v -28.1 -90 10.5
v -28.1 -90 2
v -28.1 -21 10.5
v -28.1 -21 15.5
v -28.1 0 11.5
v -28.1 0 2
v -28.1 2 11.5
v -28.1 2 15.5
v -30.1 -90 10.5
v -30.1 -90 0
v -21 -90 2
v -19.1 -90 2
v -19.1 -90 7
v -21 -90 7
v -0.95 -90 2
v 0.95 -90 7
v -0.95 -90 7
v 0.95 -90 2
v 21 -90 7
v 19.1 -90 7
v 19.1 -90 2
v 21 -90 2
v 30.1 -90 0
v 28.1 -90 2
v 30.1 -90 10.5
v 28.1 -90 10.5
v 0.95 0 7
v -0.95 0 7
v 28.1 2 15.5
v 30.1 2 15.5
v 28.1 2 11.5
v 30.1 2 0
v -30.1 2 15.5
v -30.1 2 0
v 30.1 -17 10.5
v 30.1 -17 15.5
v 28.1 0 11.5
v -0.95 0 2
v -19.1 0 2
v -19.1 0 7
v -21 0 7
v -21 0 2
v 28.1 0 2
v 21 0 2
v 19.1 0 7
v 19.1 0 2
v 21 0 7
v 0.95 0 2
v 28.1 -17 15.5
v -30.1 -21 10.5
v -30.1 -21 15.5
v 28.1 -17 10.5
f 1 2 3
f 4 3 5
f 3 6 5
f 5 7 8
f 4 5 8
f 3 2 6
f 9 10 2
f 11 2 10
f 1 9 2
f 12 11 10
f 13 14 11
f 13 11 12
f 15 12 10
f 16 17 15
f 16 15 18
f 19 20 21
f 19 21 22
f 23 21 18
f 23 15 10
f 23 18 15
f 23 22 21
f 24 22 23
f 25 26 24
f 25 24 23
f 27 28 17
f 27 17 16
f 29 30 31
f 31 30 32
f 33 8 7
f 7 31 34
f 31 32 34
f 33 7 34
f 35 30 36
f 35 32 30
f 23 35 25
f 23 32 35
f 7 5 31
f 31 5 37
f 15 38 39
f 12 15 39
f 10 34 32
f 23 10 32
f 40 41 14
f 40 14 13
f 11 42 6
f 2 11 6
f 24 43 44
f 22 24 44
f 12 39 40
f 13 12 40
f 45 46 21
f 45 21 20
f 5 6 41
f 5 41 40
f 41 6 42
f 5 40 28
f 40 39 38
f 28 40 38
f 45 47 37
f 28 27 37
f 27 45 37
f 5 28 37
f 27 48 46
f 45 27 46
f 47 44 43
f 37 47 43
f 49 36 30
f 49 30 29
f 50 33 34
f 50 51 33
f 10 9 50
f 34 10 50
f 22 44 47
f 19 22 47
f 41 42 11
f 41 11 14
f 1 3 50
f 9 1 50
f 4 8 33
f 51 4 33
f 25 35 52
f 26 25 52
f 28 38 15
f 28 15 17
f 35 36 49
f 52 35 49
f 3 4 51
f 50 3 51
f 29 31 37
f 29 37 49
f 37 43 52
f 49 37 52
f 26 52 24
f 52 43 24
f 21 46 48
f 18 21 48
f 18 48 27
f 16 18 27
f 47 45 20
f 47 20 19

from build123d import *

# Parameters (mm, degrees)
SKETCH_W      = 1.9
SKETCH_H      = 5
PAD_DEPTH     = 90
SKETCH001_W   = 2
SKETCH001_H   = 69
SKETCH001_H_2 = 73
POCKET_DEPTH  = 5
SKETCH002_W   = 60.2
SKETCH002_H   = 11.5
PAD001_DEPTH  = 2
SKETCH004_W   = 2
SKETCH004_H   = 2
PAD002_DEPTH  = 4


with BuildPart() as part:
    # Sketch → Pad (new body)
    with BuildSketch(Plane.XZ):
        Polygon((-30.1, 0), (30.1, 0), (30.1, 15.5), (28.1, 15.5), (28.1, 2), (-28.1, 2), (-28.1, 15.5), (-30.1, 15.5), align=None)
        with Locations((0, 4.5)):
            Rectangle(SKETCH_W, SKETCH_H)
        with Locations((-20.05, 4.5)):
            Rectangle(SKETCH_W, SKETCH_H)
        with Locations((20.05, 4.5)):
            Rectangle(SKETCH_W, SKETCH_H)
    extrude(amount=PAD_DEPTH)

    # Sketch001 (on Face3 of Pad) → Pocket (cut)
    with BuildSketch(Plane(origin=(0, 0, 15.5), x_dir=(-1, 0, 0), z_dir=(0, 0, 1))):
        with Locations((29.1, 55.5)):
            Rectangle(SKETCH001_W, SKETCH001_H)
        with Locations((-29.1, 53.5)):
            Rectangle(SKETCH001_W, SKETCH001_H_2)
    extrude(amount=-POCKET_DEPTH, mode=Mode.SUBTRACT)

    # Sketch002 (on Face2 of Pocket) → Pad001 (join)
    with BuildSketch(Plane(origin=(0, 0, 0), x_dir=(1, 0, 0), z_dir=(0, 1, 0))):
        with Locations((0, -5.75)):
            Rectangle(SKETCH002_W, SKETCH002_H)
    extrude(amount=PAD001_DEPTH)

    # Sketch004 → Pad002 (join)
    with BuildSketch(Plane(origin=(0, 0, 11.5), x_dir=(-1, 0, 0), z_dir=(0, 0, 1))):
        with Locations((-29.1, -1)):
            Rectangle(SKETCH004_W, SKETCH004_H)
        with Locations((29.1, -1)):
            Rectangle(SKETCH004_W, SKETCH004_H)
    extrude(amount=PAD002_DEPTH)


solid = part.part
